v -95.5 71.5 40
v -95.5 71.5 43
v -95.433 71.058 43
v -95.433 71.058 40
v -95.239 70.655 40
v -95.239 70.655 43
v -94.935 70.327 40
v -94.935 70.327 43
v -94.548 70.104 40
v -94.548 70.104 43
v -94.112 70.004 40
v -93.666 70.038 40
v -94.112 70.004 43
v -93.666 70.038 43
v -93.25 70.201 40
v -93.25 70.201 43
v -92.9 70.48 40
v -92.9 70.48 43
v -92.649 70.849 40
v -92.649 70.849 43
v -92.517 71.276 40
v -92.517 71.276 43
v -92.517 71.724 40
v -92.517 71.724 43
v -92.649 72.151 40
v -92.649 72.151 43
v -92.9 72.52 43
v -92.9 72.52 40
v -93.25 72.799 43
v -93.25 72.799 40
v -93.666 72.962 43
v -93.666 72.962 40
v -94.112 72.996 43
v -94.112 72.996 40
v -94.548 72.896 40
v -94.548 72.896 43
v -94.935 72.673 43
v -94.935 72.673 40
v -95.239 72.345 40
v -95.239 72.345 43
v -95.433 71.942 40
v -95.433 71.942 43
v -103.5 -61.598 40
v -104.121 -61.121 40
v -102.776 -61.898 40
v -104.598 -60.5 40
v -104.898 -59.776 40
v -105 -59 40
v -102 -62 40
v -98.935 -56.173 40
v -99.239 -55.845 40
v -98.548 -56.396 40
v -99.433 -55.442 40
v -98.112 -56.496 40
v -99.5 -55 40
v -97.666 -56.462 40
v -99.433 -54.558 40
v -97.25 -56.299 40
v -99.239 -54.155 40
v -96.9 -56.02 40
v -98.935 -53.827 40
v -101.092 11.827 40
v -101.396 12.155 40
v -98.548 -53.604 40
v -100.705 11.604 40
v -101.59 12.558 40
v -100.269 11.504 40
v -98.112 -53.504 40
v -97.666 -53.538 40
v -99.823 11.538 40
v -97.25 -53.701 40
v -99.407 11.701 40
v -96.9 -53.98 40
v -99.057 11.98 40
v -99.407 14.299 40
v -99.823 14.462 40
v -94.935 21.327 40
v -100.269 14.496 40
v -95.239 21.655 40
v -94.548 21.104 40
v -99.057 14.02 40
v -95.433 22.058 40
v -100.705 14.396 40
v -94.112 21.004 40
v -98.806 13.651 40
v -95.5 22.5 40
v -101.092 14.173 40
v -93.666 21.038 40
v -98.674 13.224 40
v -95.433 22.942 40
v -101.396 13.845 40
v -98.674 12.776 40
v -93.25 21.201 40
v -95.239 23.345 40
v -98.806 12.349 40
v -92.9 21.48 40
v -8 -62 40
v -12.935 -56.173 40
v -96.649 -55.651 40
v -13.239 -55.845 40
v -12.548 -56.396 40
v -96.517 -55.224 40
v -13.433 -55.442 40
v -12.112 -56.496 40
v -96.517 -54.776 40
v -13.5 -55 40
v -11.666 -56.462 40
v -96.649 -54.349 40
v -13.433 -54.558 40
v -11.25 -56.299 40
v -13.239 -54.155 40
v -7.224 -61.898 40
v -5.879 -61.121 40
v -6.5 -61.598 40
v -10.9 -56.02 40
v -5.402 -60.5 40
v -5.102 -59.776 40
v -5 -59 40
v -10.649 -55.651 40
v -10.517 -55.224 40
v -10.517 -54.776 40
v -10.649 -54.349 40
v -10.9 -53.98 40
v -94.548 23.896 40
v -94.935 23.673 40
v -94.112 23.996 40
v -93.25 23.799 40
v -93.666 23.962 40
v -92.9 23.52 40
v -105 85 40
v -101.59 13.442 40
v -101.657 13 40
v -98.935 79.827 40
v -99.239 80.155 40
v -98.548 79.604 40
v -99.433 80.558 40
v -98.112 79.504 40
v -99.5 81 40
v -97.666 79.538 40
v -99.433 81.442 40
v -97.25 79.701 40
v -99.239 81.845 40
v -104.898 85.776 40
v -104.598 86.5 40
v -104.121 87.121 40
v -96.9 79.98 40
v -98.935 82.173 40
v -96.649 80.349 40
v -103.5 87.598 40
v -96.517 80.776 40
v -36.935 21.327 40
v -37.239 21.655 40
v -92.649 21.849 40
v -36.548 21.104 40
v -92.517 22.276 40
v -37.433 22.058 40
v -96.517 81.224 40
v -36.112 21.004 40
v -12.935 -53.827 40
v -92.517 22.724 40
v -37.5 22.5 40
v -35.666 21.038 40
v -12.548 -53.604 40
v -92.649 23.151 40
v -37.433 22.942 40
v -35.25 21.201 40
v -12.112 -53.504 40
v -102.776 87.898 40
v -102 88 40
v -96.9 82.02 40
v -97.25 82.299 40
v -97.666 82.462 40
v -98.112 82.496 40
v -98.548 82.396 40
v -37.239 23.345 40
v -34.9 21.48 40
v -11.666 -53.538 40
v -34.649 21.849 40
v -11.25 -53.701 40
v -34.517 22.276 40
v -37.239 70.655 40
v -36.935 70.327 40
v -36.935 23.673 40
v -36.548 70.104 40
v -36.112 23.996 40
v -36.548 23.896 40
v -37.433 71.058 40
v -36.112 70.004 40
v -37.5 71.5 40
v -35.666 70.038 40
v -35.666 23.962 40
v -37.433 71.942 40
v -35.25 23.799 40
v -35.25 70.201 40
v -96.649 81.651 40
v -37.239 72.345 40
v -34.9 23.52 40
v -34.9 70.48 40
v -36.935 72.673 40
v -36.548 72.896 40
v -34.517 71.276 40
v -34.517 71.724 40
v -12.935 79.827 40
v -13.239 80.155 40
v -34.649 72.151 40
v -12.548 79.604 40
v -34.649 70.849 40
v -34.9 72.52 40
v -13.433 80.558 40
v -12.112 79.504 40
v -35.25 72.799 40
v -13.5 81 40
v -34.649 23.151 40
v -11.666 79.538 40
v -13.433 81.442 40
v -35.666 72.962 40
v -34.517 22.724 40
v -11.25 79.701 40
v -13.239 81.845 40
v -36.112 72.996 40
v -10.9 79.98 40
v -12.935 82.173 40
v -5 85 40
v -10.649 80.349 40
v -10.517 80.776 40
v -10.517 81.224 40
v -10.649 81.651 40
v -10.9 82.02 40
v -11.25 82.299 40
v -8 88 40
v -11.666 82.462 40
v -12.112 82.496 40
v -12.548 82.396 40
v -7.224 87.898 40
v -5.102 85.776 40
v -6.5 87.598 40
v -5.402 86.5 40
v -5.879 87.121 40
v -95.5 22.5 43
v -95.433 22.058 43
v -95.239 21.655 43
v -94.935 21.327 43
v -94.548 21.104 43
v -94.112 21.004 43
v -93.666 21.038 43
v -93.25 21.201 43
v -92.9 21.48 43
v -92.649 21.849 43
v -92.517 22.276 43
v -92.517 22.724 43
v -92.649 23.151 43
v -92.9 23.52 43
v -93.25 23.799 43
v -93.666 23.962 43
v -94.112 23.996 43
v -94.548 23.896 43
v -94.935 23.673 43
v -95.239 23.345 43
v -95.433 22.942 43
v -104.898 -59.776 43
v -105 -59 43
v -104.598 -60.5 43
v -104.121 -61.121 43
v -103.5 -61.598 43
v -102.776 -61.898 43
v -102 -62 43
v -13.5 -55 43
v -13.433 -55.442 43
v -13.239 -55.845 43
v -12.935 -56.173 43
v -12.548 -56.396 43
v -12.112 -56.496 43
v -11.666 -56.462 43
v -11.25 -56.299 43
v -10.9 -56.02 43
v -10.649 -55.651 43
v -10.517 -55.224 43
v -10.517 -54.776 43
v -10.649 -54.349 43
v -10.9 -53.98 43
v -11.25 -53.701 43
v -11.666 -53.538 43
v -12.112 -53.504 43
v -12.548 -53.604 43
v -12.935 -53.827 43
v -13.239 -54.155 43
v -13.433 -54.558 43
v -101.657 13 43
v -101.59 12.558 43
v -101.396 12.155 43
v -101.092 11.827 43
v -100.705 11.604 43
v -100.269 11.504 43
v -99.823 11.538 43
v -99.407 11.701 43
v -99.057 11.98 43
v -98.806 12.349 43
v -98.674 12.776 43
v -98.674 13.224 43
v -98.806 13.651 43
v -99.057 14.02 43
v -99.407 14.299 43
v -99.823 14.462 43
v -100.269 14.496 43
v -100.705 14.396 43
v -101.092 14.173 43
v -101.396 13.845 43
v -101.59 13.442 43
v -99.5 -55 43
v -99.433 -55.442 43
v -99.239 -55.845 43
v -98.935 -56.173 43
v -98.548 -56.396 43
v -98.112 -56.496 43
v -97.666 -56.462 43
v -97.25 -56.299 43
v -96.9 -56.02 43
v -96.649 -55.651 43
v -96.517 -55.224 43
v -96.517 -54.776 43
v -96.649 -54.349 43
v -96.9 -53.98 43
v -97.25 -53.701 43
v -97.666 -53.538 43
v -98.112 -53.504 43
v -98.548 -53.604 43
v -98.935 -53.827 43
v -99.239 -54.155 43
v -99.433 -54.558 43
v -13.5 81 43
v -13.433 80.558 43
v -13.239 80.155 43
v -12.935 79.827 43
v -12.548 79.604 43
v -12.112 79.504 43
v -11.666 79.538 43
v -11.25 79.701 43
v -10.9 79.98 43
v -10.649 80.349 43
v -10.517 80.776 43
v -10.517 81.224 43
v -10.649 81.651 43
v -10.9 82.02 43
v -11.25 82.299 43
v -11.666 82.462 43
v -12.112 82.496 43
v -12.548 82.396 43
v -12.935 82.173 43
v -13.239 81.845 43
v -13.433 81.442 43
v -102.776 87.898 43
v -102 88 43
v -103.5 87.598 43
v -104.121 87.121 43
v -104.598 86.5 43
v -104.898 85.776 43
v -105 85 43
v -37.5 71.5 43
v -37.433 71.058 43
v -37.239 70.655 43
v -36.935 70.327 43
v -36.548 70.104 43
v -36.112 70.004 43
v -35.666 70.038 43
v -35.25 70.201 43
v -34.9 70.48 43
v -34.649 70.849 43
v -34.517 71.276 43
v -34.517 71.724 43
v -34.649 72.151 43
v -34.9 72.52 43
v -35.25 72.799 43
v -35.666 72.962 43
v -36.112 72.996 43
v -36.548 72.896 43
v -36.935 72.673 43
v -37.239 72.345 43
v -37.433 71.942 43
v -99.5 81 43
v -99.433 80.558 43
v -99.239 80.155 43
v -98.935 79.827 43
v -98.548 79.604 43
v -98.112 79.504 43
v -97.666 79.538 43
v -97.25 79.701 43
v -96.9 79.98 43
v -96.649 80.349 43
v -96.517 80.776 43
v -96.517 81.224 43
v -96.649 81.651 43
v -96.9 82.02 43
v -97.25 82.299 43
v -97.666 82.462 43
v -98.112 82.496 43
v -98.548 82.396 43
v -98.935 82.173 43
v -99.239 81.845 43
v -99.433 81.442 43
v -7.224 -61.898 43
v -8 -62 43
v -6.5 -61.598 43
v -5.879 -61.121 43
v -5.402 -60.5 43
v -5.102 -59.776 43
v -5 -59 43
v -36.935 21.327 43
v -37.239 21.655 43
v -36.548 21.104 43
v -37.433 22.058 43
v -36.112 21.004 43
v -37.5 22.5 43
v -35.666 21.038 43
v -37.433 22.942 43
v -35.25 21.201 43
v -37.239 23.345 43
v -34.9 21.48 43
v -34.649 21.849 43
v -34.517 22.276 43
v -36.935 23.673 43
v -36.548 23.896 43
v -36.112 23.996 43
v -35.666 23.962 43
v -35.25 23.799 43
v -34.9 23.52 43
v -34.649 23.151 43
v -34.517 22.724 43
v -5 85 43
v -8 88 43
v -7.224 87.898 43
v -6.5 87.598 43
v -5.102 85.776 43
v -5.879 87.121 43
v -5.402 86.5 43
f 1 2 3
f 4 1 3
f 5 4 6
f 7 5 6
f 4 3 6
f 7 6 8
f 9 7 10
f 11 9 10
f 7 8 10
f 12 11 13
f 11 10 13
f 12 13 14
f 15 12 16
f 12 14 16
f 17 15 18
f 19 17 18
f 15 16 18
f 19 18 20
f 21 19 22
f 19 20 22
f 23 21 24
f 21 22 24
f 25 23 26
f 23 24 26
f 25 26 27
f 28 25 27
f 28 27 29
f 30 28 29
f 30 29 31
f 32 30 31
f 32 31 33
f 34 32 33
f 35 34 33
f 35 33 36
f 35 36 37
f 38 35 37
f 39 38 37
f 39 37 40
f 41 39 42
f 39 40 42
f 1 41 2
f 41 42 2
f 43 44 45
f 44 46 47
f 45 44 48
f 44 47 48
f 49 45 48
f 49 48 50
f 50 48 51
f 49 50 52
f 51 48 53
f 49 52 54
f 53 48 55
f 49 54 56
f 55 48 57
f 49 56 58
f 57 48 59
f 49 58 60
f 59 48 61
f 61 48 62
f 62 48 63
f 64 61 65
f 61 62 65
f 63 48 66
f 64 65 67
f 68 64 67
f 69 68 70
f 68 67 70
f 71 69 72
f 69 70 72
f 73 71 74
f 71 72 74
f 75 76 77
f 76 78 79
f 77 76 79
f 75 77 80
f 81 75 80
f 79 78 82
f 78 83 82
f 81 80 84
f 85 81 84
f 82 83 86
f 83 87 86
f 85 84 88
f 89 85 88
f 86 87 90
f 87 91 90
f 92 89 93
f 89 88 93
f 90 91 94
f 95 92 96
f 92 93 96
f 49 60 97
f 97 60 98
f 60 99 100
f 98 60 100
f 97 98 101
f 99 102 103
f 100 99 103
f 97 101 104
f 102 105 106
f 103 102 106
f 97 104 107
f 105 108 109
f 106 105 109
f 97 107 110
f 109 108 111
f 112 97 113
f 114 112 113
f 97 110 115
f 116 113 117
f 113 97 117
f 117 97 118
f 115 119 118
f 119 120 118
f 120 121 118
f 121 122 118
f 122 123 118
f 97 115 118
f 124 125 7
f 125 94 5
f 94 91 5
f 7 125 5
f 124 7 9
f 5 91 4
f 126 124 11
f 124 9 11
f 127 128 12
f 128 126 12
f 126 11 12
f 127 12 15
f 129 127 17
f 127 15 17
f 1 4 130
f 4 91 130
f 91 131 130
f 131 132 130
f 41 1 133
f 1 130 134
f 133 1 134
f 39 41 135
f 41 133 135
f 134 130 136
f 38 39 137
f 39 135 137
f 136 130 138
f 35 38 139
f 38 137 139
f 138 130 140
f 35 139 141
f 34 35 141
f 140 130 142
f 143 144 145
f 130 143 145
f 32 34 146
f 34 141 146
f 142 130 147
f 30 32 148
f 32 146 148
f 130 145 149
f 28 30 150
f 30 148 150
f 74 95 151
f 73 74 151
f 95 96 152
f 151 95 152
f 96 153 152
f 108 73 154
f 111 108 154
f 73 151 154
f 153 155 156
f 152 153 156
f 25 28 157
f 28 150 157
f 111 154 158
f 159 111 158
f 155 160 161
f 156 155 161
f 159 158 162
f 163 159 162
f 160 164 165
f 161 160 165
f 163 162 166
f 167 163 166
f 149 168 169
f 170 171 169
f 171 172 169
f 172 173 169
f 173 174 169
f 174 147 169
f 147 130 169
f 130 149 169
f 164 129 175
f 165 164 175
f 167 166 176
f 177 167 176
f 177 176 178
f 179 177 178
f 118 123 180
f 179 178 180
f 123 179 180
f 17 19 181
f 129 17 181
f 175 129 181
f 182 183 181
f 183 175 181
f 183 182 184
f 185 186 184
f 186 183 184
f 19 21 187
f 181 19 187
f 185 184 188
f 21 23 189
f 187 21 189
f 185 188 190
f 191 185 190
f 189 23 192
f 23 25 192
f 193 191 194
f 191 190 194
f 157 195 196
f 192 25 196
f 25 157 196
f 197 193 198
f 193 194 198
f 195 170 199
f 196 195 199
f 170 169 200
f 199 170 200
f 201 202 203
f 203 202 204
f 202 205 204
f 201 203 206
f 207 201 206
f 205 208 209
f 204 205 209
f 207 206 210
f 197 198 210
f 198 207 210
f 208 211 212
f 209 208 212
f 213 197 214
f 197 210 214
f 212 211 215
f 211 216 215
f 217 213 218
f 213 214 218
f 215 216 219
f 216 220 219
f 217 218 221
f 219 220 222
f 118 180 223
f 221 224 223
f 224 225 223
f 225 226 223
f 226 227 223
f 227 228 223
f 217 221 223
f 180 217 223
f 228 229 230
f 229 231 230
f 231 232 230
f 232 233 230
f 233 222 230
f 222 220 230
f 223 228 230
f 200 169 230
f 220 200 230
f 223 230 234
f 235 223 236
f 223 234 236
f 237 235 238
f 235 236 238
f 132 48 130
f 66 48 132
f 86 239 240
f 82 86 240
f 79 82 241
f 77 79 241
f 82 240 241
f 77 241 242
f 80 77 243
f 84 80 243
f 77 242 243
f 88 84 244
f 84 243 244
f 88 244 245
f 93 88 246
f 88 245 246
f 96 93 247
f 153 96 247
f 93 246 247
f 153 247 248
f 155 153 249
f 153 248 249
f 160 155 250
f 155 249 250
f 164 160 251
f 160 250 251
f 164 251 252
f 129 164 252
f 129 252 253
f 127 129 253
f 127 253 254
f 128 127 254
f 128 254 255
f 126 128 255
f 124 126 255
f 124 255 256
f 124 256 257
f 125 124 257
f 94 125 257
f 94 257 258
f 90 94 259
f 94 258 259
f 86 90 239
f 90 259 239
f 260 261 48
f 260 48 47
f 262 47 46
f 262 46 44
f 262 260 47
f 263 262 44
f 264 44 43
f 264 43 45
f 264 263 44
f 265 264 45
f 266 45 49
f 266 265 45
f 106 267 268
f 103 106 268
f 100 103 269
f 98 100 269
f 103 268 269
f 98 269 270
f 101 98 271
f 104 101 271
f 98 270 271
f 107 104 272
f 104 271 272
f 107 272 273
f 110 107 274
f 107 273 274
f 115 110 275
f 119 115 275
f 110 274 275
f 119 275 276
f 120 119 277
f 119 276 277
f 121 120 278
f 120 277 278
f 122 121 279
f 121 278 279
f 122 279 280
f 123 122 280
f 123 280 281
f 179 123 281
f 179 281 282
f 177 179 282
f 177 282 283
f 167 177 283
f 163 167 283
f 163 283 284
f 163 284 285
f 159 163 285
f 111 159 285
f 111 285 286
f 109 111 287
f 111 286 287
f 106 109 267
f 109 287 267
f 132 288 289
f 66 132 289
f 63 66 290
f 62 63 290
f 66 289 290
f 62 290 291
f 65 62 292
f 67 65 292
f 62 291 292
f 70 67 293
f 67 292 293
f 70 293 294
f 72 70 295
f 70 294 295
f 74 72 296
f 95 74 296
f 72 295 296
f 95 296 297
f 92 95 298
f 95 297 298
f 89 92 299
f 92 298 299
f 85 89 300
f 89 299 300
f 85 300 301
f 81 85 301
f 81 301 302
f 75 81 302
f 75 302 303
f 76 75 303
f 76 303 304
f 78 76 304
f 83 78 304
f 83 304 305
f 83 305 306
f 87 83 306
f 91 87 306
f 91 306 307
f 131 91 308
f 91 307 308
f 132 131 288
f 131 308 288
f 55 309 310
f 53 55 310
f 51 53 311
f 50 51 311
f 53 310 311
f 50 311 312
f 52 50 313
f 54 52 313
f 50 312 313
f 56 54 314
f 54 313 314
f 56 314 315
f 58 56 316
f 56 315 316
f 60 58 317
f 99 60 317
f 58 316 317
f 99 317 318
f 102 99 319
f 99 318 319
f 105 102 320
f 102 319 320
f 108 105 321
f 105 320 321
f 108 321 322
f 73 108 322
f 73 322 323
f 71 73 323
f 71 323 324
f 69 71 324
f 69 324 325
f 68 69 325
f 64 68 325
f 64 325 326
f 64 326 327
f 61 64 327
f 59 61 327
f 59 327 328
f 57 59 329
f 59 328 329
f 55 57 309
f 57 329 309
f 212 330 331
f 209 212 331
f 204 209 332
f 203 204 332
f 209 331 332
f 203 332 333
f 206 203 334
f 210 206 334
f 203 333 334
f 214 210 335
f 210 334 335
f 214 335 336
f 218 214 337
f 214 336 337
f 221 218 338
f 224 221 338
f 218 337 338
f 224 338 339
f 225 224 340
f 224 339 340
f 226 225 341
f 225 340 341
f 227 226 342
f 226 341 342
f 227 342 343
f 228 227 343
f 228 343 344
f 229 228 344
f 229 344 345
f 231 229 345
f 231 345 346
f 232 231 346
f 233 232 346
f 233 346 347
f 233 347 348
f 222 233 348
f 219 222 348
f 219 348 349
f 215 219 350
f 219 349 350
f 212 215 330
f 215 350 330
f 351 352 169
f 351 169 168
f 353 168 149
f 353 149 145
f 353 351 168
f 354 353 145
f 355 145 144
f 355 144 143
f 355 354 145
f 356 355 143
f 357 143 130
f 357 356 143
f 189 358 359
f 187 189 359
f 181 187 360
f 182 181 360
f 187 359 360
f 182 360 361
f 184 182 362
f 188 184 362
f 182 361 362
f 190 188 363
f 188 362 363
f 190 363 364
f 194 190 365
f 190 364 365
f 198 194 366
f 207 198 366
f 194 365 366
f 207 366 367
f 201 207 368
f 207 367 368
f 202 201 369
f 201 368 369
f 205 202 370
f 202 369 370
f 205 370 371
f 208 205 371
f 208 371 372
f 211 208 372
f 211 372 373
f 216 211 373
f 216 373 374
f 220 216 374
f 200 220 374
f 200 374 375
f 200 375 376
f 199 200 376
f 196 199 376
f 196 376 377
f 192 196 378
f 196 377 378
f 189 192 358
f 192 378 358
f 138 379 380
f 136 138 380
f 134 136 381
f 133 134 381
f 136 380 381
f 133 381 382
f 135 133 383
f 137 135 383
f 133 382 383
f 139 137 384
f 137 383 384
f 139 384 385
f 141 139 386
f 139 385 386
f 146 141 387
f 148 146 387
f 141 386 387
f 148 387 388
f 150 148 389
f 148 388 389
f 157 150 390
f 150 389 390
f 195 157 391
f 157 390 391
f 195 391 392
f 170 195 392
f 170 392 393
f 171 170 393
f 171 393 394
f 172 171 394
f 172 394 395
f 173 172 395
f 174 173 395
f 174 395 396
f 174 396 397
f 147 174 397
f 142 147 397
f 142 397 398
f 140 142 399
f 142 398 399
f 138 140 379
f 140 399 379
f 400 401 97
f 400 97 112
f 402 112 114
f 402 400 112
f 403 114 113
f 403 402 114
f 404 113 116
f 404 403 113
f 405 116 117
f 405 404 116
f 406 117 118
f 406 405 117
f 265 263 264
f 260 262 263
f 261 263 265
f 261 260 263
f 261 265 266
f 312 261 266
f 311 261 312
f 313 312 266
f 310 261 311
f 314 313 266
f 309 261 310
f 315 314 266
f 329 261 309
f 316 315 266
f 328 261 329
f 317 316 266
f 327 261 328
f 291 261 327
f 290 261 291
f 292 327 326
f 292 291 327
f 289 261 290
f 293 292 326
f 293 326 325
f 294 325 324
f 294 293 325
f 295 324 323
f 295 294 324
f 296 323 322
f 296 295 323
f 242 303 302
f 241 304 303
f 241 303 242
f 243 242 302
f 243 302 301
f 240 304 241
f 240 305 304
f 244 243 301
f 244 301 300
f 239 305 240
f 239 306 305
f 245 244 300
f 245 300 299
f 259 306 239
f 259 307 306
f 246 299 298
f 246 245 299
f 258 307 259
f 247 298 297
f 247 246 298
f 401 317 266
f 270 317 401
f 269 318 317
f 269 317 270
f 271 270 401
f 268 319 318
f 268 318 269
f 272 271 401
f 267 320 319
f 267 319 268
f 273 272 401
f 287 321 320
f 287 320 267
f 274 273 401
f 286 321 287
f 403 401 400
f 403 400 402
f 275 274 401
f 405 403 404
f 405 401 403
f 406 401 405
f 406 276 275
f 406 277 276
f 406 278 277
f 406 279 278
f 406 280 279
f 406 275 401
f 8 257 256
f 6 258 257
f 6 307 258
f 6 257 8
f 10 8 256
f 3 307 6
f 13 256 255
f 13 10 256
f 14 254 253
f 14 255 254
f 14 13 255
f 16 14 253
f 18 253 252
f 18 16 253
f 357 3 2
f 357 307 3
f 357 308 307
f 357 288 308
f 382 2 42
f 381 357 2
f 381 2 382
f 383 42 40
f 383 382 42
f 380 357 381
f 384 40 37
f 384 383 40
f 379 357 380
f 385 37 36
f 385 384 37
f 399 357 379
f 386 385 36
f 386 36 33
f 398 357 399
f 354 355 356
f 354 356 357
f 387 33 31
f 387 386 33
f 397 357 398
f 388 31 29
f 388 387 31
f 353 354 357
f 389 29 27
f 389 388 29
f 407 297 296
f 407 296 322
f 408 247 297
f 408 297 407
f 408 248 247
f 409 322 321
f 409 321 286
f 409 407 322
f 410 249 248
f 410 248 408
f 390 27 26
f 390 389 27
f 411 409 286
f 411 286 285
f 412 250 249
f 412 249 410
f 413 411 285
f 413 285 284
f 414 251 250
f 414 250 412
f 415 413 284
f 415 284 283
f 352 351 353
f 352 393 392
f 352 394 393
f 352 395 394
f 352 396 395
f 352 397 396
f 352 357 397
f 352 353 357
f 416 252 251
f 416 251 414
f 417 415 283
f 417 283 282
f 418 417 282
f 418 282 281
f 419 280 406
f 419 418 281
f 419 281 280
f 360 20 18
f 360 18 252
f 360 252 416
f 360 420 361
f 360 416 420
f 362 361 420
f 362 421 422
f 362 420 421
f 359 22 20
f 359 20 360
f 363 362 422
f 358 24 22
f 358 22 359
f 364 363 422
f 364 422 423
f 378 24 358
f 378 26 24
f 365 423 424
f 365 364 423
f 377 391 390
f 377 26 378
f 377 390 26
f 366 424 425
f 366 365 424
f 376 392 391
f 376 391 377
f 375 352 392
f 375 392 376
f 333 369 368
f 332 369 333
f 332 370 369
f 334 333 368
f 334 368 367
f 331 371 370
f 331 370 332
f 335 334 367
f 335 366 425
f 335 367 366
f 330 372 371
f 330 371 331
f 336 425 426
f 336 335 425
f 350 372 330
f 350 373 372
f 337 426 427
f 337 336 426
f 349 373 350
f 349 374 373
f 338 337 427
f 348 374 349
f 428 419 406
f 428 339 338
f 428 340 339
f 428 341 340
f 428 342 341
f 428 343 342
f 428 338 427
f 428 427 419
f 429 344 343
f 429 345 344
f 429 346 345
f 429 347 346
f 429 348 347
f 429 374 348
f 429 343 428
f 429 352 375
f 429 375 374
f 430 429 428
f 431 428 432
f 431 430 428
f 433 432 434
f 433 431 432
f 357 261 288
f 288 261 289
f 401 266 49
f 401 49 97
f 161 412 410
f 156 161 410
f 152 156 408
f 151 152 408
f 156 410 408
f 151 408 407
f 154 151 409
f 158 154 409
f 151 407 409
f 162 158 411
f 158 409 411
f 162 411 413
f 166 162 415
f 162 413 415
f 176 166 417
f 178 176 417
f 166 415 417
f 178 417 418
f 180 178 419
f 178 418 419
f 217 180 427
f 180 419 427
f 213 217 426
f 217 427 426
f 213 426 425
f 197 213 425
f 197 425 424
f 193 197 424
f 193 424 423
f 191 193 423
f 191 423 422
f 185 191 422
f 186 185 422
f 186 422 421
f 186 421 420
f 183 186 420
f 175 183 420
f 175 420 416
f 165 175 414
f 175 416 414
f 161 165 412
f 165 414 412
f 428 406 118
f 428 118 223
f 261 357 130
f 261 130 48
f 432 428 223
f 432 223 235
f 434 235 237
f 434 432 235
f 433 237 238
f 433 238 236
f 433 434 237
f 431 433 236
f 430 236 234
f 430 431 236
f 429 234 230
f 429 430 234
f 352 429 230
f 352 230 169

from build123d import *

# Parameters (mm, degrees)
SKETCH_1_R      = 1.5
EXTRUDE_1_DEPTH = 3


with BuildPart() as part:
    # 草图1 → 凸台-拉伸1 (new body)
    with BuildSketch(Plane.XY.offset(43)):
        with BuildLine():
            Line((-102, -62), (-8, -62))
            ThreePointArc((-8, -62), (-5.878679656, -61.121320344), (-5, -59))
            Line((-5, -59), (-5, 85))
            ThreePointArc((-5, 85), (-5.878679656, 87.121320344), (-8, 88))
            Line((-8, 88), (-102, 88))
            ThreePointArc((-102, 88), (-104.121320344, 87.121320344), (-105, 85))
            Line((-105, 85), (-105, -59))
            ThreePointArc((-105, -59), (-104.121320344, -61.121320344), (-102, -62))
        make_face()
        with Locations(Location((-94, 71.5, 0), (0, 0, 180))):
            Circle(SKETCH_1_R, mode=Mode.SUBTRACT)
        with Locations(Location((-94, 22.5, 0), (0, 0, 180))):
            Circle(SKETCH_1_R, mode=Mode.SUBTRACT)
        with Locations(Location((-36, 22.5, 0), (0, 0, 180))):
            Circle(SKETCH_1_R, mode=Mode.SUBTRACT)
        with Locations(Location((-36, 71.5, 0), (0, 0, 180))):
            Circle(SKETCH_1_R, mode=Mode.SUBTRACT)
        with Locations(Location((-100.157022476, 13, 0), (0, 0, 180))):
            Circle(SKETCH_1_R, mode=Mode.SUBTRACT)
        with Locations(Location((-12, 81, 0), (0, 0, 180))):
            Circle(SKETCH_1_R, mode=Mode.SUBTRACT)
        with Locations(Location((-98, -55, 0), (0, 0, 180))):
            Circle(SKETCH_1_R, mode=Mode.SUBTRACT)
        with Locations(Location((-98, 81, 0), (0, 0, 180))):
            Circle(SKETCH_1_R, mode=Mode.SUBTRACT)
        with Locations(Location((-12, -55, 0), (0, 0, 180))):
            Circle(SKETCH_1_R, mode=Mode.SUBTRACT)
    extrude(amount=-EXTRUDE_1_DEPTH)


solid = part.part
